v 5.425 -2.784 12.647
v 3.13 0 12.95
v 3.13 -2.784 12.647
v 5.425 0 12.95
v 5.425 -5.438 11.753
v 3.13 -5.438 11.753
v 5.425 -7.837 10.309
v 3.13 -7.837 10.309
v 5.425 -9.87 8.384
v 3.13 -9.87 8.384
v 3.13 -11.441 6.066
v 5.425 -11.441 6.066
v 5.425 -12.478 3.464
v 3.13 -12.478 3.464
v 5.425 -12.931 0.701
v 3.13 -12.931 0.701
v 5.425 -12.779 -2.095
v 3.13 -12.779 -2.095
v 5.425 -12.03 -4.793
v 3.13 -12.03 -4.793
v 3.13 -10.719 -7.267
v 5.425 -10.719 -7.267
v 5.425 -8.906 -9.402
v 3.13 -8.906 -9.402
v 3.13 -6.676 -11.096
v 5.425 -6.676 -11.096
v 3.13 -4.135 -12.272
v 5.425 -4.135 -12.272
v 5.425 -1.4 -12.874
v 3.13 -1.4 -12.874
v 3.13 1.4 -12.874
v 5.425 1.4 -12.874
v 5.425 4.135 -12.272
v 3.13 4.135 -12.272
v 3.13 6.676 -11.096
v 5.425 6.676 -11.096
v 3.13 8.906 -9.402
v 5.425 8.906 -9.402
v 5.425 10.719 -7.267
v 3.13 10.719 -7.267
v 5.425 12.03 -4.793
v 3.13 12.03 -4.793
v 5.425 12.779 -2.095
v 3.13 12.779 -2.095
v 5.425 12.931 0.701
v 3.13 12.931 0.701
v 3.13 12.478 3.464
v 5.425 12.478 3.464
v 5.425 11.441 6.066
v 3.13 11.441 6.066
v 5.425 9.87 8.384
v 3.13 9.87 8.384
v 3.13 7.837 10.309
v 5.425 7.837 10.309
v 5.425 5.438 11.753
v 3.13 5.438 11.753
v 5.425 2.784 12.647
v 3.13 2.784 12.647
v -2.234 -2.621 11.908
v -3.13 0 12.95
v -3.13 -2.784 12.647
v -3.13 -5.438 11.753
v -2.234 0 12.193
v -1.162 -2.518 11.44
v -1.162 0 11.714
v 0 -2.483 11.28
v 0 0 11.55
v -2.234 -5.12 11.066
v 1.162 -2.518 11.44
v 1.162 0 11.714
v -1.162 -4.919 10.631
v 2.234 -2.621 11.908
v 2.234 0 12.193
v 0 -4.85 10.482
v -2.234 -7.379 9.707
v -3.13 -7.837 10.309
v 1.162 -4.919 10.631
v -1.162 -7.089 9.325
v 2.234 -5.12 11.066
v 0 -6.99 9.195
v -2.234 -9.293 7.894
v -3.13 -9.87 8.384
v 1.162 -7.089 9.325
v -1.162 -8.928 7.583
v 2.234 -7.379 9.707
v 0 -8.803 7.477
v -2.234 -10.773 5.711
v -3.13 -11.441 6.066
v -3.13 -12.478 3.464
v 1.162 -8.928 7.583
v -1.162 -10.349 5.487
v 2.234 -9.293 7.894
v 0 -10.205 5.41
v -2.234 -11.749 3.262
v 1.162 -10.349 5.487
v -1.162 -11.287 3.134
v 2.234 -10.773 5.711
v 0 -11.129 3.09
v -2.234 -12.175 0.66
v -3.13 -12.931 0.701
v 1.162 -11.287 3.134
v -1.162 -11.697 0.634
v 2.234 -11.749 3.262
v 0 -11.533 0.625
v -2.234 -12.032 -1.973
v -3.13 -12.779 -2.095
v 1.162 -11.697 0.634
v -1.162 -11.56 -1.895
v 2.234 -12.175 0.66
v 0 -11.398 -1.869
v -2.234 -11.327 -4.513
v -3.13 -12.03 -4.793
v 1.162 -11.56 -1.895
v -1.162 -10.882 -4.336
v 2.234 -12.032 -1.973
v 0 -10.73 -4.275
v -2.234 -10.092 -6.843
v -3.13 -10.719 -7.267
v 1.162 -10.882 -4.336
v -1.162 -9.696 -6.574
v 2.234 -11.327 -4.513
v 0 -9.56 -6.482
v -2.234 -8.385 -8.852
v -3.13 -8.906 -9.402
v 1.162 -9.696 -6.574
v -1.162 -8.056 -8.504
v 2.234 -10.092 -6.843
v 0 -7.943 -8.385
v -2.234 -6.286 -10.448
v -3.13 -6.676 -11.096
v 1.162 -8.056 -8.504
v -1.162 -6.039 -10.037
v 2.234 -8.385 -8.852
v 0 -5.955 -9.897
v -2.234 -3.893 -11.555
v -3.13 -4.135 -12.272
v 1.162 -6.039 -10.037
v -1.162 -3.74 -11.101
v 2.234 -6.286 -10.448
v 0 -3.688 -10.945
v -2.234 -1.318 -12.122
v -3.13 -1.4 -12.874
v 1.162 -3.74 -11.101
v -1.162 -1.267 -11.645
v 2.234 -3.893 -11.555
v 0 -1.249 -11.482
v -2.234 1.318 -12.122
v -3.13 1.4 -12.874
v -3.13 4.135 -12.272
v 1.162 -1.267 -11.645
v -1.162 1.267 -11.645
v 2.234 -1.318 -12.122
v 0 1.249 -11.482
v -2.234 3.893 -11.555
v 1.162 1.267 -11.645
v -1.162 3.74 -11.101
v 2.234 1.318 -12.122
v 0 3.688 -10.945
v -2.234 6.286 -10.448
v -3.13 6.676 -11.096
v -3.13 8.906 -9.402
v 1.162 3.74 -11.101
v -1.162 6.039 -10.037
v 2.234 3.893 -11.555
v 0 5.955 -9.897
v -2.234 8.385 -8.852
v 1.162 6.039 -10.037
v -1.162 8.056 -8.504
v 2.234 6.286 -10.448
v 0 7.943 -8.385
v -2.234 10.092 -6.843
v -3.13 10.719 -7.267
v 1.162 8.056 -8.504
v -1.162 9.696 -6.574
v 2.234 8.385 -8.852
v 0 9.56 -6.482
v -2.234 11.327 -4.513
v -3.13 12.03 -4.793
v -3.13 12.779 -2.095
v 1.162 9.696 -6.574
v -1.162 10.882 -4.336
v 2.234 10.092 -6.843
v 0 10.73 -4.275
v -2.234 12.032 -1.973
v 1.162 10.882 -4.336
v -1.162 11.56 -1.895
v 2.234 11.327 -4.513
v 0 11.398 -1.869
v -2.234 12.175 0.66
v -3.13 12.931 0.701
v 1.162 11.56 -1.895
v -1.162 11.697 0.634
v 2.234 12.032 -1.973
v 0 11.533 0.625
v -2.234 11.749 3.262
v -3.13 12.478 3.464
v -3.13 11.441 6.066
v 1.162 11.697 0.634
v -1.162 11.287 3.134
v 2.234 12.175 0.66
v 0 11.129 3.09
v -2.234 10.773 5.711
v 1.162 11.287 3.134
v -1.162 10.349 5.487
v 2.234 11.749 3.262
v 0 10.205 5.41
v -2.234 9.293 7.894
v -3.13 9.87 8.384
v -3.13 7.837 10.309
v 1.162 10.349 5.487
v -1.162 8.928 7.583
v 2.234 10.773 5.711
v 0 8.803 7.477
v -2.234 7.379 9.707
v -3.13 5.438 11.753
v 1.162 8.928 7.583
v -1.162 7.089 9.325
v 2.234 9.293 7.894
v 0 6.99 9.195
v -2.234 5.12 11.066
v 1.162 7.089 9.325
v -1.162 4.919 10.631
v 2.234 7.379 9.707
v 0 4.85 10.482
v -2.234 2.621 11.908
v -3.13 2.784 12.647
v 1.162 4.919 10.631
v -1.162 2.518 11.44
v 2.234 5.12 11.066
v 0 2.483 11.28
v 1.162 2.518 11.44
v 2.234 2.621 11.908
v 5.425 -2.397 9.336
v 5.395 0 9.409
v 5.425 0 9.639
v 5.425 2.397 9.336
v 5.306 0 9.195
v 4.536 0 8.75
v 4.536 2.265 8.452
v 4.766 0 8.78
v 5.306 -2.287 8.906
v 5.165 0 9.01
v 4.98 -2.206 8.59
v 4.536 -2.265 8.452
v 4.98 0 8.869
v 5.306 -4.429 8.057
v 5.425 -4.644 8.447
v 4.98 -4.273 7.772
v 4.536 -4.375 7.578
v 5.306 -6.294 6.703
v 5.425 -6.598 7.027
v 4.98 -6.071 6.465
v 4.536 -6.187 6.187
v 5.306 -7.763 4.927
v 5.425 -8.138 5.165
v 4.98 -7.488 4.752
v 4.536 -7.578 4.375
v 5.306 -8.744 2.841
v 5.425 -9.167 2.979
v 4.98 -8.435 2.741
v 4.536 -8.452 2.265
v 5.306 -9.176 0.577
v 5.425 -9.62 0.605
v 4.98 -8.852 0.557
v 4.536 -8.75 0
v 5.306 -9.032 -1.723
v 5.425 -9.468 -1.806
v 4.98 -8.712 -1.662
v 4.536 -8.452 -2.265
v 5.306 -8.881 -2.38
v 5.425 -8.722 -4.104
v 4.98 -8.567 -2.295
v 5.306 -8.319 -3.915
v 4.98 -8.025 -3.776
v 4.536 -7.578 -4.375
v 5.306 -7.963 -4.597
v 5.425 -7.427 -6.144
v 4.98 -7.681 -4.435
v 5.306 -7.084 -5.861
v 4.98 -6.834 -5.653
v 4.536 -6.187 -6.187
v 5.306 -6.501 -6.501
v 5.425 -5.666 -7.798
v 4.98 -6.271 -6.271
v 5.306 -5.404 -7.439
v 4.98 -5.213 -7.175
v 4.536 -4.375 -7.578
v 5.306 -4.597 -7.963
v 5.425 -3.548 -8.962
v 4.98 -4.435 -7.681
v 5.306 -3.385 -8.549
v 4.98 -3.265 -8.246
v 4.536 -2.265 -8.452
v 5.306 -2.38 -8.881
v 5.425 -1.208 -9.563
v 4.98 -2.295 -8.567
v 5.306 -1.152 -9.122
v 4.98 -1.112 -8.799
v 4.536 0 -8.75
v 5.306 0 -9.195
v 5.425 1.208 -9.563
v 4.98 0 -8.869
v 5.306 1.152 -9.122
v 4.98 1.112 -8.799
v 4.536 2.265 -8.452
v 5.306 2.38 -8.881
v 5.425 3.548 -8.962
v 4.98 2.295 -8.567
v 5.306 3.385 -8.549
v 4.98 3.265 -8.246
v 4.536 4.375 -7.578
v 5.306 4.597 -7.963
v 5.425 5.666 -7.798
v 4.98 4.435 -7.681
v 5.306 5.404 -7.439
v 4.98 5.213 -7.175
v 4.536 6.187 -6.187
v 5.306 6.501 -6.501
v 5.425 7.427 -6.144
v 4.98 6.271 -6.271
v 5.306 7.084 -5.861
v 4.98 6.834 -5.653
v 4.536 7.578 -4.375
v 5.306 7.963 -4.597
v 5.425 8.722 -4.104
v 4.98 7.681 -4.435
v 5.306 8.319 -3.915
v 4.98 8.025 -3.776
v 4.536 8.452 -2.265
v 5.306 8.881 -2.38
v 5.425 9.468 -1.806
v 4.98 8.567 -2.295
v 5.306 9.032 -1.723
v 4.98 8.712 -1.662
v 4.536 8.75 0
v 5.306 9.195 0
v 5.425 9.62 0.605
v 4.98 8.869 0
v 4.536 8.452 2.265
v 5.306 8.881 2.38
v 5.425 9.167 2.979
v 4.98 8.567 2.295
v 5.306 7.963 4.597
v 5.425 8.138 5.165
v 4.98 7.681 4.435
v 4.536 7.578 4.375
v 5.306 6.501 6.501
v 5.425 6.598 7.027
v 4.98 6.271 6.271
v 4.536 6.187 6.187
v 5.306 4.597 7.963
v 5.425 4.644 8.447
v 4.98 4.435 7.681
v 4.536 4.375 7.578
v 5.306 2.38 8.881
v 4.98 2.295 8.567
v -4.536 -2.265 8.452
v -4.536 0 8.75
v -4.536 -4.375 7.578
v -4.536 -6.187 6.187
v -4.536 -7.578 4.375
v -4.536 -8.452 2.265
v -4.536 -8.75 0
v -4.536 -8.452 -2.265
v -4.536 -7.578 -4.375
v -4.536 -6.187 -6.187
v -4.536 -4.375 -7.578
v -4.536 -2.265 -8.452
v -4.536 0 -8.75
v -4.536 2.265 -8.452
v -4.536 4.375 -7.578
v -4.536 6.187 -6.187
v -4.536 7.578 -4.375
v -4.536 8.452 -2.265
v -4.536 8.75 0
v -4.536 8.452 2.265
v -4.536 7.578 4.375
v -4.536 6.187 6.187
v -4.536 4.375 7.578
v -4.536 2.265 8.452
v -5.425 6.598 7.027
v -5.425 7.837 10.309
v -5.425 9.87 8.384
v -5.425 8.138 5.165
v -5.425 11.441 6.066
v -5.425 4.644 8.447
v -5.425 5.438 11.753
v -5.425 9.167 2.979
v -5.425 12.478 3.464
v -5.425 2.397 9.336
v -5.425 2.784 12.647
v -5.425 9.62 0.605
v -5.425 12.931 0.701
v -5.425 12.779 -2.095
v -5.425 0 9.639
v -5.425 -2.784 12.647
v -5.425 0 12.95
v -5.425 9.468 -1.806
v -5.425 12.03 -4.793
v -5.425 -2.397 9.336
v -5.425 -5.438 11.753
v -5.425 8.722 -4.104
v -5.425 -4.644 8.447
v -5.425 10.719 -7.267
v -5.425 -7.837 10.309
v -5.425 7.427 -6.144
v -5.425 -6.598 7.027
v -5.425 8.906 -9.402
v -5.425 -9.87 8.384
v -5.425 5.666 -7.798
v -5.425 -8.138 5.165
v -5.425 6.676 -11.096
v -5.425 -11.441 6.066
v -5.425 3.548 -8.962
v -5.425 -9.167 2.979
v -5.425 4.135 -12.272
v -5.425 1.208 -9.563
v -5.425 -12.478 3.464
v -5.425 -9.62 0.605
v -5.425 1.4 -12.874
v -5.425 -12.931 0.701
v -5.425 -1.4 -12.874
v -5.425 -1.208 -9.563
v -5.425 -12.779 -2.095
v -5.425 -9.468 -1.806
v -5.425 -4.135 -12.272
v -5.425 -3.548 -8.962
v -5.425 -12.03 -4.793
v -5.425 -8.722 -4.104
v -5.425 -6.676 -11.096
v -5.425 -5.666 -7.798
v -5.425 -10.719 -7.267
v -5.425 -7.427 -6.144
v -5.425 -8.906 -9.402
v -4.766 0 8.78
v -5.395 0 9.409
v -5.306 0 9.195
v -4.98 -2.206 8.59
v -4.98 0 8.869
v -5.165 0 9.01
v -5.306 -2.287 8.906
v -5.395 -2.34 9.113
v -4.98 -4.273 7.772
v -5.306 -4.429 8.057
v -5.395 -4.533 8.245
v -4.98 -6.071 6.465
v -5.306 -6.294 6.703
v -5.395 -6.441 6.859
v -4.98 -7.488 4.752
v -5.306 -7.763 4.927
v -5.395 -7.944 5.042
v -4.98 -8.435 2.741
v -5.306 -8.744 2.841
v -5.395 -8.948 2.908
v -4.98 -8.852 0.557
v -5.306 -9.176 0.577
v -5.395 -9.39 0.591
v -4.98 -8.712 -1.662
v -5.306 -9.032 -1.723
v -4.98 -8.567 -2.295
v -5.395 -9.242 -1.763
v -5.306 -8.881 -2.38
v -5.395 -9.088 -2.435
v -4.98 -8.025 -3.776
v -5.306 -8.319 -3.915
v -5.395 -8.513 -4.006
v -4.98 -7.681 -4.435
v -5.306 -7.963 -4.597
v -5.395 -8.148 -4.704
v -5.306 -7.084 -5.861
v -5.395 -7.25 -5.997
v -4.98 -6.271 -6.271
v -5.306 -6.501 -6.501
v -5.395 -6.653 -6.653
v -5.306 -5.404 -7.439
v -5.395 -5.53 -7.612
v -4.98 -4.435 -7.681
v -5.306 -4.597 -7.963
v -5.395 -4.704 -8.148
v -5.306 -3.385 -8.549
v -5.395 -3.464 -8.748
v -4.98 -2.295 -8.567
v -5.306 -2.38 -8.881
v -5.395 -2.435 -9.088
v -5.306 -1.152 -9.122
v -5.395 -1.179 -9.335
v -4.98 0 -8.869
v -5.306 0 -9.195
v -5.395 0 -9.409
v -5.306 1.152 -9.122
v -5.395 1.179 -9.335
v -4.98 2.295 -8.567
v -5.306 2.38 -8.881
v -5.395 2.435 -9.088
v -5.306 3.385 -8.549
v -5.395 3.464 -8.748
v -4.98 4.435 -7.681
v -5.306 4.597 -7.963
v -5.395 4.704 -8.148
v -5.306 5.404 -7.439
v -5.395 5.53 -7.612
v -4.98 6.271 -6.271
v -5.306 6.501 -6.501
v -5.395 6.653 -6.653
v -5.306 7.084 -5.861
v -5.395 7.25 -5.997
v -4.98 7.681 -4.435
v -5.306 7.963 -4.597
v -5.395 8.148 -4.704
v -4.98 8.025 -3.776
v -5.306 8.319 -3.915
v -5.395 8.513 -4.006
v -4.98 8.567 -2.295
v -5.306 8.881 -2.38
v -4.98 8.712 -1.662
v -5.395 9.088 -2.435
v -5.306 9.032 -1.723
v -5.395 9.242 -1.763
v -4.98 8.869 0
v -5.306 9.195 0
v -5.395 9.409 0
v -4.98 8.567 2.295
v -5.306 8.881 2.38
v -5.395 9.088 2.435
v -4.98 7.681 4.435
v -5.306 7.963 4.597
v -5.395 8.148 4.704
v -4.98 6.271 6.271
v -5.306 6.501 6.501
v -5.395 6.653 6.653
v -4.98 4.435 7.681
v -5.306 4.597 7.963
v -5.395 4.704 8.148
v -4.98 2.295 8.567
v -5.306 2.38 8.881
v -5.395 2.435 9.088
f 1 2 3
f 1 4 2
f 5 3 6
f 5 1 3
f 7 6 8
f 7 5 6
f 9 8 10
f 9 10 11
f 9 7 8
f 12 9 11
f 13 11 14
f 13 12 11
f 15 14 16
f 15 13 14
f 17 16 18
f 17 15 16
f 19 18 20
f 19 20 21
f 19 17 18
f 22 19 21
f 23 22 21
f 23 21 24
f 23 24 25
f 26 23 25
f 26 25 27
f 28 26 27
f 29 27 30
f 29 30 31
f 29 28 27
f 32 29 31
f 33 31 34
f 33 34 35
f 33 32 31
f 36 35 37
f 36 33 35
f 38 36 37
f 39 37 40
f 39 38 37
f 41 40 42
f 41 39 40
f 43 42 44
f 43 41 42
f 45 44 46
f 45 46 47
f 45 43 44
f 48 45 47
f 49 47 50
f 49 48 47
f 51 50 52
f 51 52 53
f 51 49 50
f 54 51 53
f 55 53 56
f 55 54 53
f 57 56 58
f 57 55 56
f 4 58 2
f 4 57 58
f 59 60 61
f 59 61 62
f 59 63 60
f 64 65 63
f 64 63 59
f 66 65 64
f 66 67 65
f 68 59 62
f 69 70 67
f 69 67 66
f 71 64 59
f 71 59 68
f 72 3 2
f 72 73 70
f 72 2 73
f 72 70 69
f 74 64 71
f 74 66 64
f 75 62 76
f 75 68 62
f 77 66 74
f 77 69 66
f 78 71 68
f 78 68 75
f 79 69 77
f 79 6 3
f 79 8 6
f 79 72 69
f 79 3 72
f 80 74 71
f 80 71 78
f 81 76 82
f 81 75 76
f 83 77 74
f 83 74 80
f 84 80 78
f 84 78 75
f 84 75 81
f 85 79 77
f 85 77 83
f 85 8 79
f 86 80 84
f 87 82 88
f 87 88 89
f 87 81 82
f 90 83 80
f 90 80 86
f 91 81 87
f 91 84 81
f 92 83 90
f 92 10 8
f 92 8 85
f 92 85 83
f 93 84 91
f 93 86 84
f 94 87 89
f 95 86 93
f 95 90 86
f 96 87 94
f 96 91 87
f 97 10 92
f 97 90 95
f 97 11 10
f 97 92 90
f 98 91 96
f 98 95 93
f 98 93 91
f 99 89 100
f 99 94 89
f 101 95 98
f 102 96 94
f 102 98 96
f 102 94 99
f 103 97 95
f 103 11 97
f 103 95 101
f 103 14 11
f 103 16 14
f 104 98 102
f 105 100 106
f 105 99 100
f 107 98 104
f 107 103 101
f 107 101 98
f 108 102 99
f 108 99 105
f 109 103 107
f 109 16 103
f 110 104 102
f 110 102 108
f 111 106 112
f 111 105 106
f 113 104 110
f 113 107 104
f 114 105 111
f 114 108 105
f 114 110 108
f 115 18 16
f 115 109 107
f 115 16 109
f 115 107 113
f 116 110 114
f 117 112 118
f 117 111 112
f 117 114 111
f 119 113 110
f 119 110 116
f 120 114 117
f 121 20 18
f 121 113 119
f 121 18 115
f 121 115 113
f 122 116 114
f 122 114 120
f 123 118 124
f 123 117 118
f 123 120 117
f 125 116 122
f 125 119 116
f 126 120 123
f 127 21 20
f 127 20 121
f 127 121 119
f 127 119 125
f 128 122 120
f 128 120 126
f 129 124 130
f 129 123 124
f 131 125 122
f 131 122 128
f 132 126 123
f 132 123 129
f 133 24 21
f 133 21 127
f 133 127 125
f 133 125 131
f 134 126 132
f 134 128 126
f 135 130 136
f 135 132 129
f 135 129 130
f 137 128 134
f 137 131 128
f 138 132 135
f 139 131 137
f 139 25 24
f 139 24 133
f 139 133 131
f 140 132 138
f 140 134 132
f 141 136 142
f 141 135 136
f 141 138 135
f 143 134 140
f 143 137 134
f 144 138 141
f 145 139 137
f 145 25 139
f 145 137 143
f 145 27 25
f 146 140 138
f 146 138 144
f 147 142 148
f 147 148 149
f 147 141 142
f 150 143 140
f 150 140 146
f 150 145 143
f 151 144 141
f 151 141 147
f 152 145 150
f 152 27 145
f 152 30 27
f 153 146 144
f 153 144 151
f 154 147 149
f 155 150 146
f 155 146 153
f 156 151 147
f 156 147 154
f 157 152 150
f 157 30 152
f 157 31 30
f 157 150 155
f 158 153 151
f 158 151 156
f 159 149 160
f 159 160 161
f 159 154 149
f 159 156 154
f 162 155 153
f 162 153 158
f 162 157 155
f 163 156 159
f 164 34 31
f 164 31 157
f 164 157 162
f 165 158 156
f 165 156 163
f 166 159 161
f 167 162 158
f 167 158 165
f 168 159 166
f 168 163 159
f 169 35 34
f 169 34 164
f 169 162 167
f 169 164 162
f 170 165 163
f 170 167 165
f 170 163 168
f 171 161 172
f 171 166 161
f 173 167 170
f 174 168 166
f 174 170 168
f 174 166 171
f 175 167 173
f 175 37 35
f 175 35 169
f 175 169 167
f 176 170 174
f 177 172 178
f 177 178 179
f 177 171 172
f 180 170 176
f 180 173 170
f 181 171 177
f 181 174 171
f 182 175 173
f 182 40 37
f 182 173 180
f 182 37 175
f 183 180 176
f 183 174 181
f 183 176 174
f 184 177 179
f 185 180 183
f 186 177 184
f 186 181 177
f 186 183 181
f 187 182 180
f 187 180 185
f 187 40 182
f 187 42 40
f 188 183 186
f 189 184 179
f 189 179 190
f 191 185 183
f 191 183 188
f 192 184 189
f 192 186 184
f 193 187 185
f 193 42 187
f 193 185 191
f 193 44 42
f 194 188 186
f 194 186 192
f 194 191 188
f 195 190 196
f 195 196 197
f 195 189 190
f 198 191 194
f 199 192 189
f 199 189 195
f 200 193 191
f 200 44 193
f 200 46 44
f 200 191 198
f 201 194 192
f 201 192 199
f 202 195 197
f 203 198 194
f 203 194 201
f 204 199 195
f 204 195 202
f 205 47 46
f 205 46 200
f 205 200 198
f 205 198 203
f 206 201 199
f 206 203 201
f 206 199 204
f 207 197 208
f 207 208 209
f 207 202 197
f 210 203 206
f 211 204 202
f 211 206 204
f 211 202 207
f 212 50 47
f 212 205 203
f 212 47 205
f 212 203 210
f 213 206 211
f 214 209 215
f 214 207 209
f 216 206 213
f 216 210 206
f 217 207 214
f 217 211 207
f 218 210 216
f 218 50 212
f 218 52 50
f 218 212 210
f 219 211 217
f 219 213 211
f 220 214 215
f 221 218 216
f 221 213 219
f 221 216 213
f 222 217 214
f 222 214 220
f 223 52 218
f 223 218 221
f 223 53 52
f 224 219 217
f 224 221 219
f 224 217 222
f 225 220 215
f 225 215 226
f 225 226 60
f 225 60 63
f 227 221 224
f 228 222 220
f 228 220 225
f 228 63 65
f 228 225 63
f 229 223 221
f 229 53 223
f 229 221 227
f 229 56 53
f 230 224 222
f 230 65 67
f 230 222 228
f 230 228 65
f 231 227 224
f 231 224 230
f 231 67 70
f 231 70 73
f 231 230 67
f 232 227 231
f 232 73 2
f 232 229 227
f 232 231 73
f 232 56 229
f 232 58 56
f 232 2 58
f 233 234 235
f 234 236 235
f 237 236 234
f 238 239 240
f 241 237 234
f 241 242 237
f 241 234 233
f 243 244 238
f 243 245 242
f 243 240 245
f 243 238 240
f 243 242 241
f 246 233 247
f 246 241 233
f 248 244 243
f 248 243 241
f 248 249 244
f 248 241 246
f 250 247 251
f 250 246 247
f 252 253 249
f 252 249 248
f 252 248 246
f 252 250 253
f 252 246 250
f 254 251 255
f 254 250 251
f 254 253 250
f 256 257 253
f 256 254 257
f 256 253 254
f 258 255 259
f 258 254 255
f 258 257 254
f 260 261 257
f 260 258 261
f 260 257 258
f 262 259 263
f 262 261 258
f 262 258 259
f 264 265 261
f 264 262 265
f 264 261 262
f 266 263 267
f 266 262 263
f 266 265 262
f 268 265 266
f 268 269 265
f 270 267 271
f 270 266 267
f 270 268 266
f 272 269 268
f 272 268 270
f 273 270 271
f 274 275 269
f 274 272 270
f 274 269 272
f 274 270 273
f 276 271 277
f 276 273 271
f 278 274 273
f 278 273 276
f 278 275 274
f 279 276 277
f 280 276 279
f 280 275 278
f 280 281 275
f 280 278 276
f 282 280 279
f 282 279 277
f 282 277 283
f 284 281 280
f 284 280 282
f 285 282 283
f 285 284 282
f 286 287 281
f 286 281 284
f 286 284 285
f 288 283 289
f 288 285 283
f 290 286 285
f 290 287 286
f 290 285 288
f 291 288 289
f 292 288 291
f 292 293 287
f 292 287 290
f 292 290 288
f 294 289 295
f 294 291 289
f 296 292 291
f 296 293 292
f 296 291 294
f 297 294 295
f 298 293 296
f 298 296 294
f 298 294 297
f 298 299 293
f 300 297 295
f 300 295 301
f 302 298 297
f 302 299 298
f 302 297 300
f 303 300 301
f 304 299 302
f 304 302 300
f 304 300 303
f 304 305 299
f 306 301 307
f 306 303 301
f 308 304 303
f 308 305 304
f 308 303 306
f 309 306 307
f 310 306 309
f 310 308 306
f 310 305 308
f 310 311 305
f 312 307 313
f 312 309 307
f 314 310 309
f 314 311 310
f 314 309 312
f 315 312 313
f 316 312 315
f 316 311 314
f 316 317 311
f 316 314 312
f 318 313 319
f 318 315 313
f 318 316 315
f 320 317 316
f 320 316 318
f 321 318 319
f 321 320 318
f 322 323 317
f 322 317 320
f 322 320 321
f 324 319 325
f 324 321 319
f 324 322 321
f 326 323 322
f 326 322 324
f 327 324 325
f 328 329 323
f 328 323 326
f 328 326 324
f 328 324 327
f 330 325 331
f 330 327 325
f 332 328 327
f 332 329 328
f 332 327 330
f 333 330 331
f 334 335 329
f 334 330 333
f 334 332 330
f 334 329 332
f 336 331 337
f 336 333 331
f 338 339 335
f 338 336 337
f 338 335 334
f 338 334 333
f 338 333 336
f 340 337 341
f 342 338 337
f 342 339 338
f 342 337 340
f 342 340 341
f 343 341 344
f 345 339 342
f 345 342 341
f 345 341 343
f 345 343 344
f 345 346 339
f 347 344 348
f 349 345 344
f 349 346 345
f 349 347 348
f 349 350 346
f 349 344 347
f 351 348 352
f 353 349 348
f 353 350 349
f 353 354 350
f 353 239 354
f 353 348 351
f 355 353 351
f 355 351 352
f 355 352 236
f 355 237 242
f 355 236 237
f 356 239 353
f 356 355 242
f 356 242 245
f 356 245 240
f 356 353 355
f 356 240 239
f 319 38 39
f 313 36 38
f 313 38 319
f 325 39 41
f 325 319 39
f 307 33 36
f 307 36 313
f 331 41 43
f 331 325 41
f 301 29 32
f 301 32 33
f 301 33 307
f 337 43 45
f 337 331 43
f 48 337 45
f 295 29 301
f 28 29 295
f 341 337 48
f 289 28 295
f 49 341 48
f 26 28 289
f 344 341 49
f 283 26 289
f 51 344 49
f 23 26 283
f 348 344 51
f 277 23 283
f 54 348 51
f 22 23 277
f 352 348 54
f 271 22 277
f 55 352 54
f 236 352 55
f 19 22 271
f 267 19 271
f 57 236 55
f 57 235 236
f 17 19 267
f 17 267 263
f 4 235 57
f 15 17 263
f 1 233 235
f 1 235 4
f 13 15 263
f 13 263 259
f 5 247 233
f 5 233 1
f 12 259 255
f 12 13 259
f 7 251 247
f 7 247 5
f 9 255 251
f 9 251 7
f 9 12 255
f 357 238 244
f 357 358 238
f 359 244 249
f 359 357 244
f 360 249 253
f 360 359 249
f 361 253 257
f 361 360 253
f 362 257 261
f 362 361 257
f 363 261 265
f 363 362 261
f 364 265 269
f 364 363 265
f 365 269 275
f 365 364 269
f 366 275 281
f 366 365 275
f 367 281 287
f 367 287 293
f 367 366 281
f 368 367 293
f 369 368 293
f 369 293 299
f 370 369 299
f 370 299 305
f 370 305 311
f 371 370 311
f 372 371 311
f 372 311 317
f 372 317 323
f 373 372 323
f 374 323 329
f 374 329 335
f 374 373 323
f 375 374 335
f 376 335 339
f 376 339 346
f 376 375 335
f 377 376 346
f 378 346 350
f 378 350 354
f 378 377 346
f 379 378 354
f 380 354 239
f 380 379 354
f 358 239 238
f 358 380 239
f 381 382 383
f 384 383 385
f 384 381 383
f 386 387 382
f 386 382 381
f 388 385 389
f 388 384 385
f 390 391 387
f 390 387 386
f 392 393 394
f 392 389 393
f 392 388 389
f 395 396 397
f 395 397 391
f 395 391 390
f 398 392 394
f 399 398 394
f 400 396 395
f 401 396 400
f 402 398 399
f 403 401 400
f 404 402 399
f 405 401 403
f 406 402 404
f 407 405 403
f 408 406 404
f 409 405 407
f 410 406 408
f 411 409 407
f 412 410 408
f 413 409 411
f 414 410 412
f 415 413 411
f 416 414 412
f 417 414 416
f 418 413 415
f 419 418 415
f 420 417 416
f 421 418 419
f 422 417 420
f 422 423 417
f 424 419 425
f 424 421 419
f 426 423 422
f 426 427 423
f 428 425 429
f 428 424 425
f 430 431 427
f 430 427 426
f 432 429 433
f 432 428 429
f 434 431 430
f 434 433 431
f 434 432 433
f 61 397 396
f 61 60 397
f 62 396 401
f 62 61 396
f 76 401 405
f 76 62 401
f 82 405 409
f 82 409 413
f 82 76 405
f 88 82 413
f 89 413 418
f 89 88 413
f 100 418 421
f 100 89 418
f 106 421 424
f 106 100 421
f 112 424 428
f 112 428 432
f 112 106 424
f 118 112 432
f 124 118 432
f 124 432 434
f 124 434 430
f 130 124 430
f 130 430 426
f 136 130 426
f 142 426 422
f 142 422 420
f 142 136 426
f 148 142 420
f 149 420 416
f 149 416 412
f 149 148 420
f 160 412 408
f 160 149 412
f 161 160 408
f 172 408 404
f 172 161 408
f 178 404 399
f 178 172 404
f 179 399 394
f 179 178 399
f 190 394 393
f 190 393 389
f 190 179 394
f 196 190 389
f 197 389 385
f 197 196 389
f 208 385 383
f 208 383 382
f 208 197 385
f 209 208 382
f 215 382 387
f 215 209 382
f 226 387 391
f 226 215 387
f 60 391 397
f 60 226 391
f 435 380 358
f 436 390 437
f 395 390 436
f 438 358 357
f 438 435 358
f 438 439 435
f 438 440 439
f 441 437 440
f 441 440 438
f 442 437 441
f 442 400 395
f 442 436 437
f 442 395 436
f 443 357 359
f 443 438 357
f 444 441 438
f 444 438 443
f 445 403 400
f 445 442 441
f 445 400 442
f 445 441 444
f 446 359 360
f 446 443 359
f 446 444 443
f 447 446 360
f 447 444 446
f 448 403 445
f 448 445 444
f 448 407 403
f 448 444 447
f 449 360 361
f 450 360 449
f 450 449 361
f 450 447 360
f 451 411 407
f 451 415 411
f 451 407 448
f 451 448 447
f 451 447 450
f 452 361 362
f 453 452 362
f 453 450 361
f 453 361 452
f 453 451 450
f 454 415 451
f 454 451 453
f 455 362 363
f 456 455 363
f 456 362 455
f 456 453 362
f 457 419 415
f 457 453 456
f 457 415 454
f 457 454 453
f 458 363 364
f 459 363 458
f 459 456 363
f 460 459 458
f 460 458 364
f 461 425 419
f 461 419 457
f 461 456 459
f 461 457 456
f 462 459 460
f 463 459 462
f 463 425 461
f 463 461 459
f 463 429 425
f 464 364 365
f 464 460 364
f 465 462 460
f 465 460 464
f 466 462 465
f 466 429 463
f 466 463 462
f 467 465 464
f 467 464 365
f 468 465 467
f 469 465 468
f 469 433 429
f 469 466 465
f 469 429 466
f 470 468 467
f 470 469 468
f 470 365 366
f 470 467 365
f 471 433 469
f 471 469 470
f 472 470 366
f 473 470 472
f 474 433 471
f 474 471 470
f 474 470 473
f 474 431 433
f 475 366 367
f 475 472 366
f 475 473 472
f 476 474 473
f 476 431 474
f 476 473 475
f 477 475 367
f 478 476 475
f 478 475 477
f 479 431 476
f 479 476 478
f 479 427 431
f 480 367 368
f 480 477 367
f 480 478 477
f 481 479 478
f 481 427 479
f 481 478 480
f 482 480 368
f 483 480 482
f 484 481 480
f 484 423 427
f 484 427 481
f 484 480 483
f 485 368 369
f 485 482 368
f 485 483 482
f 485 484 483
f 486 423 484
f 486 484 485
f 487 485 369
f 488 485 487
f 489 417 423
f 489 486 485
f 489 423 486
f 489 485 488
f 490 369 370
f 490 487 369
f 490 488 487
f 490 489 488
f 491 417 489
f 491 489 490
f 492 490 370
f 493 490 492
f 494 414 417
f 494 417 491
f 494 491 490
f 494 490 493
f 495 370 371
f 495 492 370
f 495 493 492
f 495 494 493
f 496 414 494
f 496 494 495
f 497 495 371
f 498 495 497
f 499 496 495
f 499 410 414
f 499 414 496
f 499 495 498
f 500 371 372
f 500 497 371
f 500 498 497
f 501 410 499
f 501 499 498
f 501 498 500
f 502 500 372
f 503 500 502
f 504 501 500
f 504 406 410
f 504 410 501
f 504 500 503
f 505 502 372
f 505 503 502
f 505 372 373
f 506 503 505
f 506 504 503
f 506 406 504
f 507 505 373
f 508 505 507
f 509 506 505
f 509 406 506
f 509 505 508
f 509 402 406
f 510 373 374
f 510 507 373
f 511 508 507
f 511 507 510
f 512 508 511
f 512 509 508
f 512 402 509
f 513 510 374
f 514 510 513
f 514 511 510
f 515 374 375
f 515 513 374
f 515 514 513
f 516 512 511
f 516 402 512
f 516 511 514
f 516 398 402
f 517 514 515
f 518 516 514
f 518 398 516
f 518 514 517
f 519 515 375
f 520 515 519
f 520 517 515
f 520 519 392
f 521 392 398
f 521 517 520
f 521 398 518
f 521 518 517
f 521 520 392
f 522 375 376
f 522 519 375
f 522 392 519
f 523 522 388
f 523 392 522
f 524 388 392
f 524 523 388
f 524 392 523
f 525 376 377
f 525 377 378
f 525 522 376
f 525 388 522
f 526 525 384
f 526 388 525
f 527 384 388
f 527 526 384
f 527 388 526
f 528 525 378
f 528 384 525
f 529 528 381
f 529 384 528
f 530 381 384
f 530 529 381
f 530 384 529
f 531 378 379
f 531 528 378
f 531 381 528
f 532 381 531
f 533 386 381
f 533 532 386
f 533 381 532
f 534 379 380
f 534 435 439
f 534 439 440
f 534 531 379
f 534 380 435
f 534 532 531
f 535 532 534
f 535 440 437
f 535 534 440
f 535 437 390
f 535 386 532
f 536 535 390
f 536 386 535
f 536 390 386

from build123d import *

# Parameters (mm, degrees)
SCALE1_SCALE = 0.35


with BuildPart() as part:
    # Sketch1 → Revolve1 (revolve)
    with BuildSketch(Plane.XY, mode=Mode.PRIVATE) as revolve1_sk:
        with BuildLine():
            Line((-15.5, 37), (-8.94427191, 37))
            ThreePointArc((-8.94427191, 37), (0, 33), (8.94427191, 37))
            Line((8.94427191, 37), (15.5, 37))
            Line((15.5, 37), (15.5, 27.54))
            ThreePointArc((15.5, 27.54), (14.756051224, 25.743948776), (12.96, 25))
            Line((12.96, 25), (-12.96, 25))
            ThreePointArc((-12.96, 25), (-14.756051224, 25.743948776), (-15.5, 27.54))
            Line((-15.5, 27.54), (-15.5, 37))
        make_face()
    revolve(revolve1_sk.sketch.rotate(Axis((-21.666666667, 0, 0), (1, 0, 0)), 90), axis=Axis((-21.666666667, 0, 0), (1, 0, 0)))


with BuildPart() as part_1:
    # Scale1: scaled about (0, 0, 0)
    add(part.part.scale(SCALE1_SCALE))


solid = part_1.part
